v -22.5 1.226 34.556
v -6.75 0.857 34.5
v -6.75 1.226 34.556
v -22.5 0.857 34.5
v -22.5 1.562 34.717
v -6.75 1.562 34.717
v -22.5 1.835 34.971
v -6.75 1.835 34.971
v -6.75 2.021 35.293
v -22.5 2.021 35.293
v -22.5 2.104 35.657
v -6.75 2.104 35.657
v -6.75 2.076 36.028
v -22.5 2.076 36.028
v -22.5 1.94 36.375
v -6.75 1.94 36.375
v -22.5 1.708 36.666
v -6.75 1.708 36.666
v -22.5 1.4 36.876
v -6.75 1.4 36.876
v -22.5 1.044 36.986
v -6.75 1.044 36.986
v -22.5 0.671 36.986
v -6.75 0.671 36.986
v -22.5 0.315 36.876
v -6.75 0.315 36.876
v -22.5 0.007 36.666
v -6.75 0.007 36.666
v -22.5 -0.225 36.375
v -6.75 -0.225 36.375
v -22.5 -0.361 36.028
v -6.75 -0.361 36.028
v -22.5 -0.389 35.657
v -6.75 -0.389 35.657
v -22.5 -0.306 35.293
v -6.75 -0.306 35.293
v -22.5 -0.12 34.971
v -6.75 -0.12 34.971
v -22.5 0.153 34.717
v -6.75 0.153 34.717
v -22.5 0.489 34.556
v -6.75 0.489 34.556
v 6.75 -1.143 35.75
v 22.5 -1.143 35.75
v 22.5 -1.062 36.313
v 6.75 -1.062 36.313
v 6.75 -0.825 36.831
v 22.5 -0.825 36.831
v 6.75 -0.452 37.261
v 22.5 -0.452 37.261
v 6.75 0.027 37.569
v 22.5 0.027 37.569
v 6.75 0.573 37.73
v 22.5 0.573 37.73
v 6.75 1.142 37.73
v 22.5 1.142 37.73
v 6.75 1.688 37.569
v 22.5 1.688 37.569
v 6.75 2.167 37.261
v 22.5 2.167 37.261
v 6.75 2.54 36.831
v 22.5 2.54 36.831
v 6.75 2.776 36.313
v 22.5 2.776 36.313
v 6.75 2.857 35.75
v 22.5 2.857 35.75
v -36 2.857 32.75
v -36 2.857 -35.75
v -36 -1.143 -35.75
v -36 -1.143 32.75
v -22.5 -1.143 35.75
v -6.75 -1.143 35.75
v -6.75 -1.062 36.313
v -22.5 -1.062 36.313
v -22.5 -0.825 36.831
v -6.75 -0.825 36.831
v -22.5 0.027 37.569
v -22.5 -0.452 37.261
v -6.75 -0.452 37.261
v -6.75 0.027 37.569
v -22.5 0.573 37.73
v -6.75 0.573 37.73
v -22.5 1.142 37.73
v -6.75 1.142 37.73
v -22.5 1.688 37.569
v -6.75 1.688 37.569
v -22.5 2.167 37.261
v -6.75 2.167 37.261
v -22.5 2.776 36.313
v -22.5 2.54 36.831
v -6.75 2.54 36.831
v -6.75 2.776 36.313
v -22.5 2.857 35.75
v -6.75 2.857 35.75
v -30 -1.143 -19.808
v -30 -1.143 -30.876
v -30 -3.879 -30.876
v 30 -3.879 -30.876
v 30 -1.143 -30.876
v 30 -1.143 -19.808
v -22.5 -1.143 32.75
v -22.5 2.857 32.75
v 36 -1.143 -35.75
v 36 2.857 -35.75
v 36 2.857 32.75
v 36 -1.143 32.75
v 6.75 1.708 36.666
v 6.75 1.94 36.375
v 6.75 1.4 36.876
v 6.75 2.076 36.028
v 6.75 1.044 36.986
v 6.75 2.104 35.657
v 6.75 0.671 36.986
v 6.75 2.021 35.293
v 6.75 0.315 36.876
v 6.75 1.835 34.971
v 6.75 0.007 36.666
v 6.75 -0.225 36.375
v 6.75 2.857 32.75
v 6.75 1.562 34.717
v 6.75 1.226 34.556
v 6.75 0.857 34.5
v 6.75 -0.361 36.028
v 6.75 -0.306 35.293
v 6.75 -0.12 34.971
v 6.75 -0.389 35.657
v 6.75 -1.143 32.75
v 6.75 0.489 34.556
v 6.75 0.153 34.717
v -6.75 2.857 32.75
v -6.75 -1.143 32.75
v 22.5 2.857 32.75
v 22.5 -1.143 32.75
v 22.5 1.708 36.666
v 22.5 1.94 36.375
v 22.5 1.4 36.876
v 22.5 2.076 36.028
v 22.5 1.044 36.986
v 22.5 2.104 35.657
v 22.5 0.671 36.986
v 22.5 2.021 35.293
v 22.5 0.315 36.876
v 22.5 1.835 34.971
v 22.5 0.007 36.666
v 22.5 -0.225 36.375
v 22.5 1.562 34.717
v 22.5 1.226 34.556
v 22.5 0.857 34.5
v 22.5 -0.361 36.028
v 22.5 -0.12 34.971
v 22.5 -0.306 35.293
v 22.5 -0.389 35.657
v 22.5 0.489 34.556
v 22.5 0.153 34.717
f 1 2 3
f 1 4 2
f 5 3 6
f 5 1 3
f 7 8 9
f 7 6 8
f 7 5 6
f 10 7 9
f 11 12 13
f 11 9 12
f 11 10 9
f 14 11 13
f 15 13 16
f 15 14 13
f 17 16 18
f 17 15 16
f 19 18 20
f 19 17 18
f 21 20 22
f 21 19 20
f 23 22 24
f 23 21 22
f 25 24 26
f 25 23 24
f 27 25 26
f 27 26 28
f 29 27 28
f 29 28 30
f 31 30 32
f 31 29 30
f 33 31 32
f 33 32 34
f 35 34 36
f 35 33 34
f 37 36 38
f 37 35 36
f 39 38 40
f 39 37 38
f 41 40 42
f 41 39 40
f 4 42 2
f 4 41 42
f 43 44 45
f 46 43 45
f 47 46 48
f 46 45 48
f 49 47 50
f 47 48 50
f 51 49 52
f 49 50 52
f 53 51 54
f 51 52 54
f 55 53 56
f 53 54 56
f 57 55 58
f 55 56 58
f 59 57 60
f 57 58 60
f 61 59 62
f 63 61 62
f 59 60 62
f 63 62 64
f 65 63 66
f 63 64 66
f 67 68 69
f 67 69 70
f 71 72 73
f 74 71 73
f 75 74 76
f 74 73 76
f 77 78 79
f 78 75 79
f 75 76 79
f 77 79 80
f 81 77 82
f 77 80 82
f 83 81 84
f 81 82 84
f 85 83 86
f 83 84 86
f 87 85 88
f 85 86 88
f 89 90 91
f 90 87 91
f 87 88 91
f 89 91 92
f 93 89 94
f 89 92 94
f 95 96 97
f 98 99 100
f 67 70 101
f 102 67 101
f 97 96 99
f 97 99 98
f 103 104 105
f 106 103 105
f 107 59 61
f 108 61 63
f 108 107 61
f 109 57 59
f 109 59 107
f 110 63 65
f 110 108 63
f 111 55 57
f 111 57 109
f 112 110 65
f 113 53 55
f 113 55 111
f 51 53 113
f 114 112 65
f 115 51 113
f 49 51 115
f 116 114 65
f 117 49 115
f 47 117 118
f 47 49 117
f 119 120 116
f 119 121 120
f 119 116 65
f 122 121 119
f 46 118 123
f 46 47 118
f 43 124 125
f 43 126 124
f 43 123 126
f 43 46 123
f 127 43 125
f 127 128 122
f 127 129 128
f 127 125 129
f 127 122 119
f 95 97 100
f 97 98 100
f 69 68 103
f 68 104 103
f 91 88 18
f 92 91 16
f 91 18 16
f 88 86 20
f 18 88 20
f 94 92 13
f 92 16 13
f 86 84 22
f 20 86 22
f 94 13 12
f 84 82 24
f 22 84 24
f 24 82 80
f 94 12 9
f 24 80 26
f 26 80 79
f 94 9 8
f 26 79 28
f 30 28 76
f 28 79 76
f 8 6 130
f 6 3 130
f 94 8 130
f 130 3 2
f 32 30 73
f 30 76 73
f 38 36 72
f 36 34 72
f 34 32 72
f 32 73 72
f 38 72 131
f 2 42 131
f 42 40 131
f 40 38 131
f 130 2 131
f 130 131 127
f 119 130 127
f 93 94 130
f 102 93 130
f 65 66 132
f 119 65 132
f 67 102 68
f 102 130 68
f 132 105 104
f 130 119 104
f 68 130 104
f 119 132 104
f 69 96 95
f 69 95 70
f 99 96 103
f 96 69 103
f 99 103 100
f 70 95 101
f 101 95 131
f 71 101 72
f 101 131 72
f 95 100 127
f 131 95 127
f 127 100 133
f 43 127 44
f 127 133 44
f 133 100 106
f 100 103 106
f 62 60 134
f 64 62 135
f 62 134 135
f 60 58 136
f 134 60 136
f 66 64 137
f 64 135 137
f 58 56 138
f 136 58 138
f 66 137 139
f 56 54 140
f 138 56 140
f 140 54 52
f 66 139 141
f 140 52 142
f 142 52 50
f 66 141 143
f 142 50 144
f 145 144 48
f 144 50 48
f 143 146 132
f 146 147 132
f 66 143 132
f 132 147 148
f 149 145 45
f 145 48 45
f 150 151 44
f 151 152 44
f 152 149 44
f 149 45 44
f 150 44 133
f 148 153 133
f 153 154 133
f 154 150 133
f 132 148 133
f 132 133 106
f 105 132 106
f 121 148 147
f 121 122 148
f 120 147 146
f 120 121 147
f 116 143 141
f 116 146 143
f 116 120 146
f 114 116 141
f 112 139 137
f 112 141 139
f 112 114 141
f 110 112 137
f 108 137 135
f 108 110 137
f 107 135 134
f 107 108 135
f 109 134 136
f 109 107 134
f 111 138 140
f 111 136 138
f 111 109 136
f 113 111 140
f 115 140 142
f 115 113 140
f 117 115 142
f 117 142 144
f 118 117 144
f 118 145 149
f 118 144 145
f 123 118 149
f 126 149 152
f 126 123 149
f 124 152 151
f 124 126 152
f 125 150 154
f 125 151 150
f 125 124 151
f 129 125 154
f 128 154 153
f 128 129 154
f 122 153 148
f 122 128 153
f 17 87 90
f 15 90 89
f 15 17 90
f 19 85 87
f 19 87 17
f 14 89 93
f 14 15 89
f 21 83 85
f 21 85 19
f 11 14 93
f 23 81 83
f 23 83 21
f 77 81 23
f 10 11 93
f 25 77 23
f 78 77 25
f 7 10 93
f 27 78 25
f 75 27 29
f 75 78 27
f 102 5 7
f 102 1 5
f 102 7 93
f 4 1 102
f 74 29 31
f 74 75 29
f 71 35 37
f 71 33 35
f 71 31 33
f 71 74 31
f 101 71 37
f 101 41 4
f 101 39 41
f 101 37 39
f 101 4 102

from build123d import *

# Parameters (mm, degrees)
SKETCH3_R               = 1.25
BOSS_EXTRUDE2_DEPTH     = 36
CUT_EXTRUDE1_DEPTH      = 53.24200467
CUT_EXTRUDE1_DEPTH_BACK = 53.24200467
SKETCH4_W               = 13.5
SKETCH4_H               = 5
BOSS_EXTRUDE3_DEPTH     = 30


with BuildPart() as part:
    # Sketch3 → Boss-Extrude2 (new, symmetric)
    with BuildSketch(Plane(origin=(0, 0, 0), x_dir=(0, 0, -1), z_dir=(1, 0, 0))):
        with BuildLine():
            Line((-35.75, 2.857368006), (35.75, 2.857368006))
            Line((35.75, 2.857368006), (35.75, -1.142631994))
            Line((35.75, -1.142631994), (-35.75, -1.142631994))
            ThreePointArc((-35.75, -1.142631994), (-37.75, 0.857368006), (-35.75, 2.857368006))
        make_face()
        with Locations((-35.75, 0.857368006)):
            Circle(SKETCH3_R, mode=Mode.SUBTRACT)
    extrude(amount=BOSS_EXTRUDE2_DEPTH, both=True)

    # Sketch4 → Cut-Extrude1 (cut, two sides: drawn at the far end of the back side and taken through both)
    with BuildSketch(Plane(origin=(0, 0, 0), x_dir=(1, 0, 0), z_dir=(0, 1, 0)).offset(-CUT_EXTRUDE1_DEPTH_BACK)):
        with Locations((-29.25, -35.25)):
            Rectangle(SKETCH4_W, SKETCH4_H)
        with Locations((29.25, -35.25)):
            Rectangle(SKETCH4_W, SKETCH4_H)
        with Locations((0, -35.25)):
            Rectangle(SKETCH4_W, SKETCH4_H)
    extrude(amount=CUT_EXTRUDE1_DEPTH + CUT_EXTRUDE1_DEPTH_BACK, mode=Mode.SUBTRACT)

    # Sketch7 → Boss-Extrude3 (add, symmetric)
    with BuildSketch(Plane(origin=(0, 0, 0), x_dir=(0, 0, -1), z_dir=(1, 0, 0))):
        Polygon((30.876330293, -1.142631994), (30.876330293, -3.878672559), (19.808295325, -1.142631994), align=None)
    extrude(amount=BOSS_EXTRUDE3_DEPTH, both=True)


solid = part.part
